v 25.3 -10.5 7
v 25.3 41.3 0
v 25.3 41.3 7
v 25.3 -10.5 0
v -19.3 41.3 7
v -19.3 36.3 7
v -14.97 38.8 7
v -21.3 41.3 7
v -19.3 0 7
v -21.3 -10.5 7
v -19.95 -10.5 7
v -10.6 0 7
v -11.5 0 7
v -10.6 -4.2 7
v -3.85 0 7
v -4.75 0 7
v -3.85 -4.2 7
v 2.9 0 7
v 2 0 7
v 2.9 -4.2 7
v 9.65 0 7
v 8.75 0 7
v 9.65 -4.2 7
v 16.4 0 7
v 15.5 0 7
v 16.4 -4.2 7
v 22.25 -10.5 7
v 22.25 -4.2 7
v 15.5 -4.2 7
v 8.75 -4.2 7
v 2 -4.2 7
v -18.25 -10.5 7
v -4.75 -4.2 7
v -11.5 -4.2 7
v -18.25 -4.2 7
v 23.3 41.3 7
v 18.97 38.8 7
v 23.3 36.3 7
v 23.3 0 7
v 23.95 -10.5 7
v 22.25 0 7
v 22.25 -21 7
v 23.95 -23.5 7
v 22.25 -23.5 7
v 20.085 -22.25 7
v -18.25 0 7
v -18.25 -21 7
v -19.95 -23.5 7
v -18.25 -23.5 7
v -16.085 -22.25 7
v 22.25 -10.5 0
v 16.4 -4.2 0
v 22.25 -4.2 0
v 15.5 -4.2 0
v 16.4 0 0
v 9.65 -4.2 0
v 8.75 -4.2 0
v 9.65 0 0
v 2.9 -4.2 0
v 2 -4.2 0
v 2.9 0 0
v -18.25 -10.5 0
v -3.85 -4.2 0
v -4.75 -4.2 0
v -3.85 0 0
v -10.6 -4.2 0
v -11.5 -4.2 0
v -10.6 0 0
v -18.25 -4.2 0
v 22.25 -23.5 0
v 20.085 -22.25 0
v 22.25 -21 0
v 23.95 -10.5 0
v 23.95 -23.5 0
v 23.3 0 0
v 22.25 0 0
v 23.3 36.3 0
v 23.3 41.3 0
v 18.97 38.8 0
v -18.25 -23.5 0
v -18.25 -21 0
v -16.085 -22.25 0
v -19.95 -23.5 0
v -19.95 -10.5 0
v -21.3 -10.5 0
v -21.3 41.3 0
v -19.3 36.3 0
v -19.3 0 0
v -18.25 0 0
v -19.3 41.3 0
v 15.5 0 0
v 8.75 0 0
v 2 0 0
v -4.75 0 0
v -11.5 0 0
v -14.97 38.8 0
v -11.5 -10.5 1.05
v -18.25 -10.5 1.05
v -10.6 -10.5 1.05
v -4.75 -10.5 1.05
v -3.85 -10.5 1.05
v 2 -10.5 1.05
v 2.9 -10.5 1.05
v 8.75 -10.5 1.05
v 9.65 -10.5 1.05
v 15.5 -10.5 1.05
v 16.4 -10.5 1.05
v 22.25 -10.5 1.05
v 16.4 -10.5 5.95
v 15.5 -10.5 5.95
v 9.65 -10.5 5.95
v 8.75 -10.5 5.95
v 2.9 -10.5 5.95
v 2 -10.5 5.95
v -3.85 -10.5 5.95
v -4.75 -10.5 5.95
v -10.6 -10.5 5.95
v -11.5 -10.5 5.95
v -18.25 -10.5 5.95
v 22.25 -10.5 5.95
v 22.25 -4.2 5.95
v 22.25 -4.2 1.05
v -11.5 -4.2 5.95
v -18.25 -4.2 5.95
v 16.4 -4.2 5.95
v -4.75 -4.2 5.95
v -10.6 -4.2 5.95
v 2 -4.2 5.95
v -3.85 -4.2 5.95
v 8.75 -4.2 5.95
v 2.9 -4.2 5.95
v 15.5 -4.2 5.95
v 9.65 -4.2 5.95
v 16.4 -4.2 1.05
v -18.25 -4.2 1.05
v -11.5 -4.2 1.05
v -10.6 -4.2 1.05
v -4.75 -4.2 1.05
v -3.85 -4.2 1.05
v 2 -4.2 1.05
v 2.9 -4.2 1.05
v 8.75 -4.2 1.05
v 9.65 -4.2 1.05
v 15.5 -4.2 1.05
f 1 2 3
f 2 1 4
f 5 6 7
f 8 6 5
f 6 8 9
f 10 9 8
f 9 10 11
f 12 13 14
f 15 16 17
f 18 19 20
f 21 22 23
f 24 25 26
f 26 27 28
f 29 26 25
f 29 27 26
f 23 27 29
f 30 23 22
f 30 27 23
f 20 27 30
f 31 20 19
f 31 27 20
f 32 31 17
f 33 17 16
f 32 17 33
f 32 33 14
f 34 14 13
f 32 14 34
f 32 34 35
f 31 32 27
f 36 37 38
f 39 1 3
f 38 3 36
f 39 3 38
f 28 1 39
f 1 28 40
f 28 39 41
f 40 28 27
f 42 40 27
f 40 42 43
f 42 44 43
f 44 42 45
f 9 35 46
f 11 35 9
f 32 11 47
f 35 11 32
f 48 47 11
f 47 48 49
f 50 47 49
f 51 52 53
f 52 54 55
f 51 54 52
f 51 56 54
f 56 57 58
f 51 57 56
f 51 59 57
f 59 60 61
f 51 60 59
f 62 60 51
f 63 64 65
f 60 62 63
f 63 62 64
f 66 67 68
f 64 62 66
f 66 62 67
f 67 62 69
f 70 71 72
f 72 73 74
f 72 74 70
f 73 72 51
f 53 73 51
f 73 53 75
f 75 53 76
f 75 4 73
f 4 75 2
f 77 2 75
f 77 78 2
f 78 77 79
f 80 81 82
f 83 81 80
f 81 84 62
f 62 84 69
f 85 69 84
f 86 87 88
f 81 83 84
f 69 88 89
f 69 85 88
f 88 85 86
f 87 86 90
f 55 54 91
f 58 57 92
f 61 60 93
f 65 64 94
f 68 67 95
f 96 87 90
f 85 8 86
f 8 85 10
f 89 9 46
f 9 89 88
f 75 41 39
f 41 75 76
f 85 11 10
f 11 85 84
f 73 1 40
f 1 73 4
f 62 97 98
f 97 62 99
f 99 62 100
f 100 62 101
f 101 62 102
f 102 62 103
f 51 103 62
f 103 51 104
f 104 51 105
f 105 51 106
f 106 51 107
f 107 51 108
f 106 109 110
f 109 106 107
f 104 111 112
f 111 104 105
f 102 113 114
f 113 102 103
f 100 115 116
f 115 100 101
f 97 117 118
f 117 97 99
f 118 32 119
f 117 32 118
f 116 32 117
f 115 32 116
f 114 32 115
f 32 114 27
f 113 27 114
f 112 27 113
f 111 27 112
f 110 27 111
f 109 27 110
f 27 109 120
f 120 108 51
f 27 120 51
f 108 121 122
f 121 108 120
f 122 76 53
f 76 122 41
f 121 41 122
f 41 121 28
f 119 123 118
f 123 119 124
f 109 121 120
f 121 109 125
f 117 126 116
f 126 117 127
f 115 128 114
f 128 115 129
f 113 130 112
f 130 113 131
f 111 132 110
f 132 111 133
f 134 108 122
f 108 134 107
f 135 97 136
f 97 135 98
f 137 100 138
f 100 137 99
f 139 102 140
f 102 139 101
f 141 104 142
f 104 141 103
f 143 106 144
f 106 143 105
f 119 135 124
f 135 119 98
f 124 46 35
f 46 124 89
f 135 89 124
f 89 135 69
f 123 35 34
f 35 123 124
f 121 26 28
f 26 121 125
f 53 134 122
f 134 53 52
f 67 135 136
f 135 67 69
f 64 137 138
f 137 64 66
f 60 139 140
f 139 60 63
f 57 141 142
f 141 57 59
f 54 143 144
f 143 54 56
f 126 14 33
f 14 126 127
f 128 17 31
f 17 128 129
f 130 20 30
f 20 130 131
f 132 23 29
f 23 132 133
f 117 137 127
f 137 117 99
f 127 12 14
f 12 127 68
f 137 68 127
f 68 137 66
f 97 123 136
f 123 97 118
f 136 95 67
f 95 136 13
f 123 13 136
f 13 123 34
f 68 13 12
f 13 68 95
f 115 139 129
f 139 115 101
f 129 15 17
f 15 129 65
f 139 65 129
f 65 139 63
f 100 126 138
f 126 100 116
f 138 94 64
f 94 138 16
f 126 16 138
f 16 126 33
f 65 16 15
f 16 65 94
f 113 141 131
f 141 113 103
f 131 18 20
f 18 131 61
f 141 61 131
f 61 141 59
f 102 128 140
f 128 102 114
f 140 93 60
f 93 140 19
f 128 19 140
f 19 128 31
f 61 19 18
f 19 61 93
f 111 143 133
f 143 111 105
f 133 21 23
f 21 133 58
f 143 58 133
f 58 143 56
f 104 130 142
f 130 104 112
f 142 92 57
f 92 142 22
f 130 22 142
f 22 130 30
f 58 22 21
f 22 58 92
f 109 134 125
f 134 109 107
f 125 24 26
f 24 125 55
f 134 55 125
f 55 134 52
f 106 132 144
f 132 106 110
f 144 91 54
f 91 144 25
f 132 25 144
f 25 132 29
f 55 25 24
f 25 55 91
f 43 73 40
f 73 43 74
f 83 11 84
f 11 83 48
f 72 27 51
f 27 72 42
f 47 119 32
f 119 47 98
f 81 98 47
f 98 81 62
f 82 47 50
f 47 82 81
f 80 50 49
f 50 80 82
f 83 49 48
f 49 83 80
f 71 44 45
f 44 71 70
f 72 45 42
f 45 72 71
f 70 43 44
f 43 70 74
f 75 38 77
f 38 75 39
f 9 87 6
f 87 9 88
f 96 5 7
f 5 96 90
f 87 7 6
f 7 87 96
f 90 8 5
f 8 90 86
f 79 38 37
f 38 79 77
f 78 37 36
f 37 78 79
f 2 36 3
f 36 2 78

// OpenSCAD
//Square to Square Clip
//Example is a Nema17 motor to fan mount
//but not limited to :-).
// Author: KonKop (Bryon Wheeler)


//The object with the largest width should go to Bigger
//The object with the smallest width should go to the Smaller

//Variables
ClipHeight = 7;


//Box with the Largest Width
/* [Largest Box] */   
BiggerWidth = 42.6;
BiggerDepth = 36.3; //to hookable groove
BiggerClipSize = 2; 
BigTeethSize = 5;

//Box with Smallest Width
/* [Smallest Box] */   
SmallerWidth = 40.5;
SmallerDepth = 10.5;
SmallerClipSize = 1.7;
SmallerTeethSize = 2.5;

//
ConnectorDepth = 10.5;
ConnectorWidth = BiggerWidth;


//Air hole in the connector for air
HoleWidth = SmallerWidth;
HoleHeight = ClipHeight * .7;

HoleCutOutWidth = HoleWidth;
HoleCutOut = ConnectorDepth * .4;

NumHoleSpacers = 5;
HoleSupportSpace = (HoleWidth / (NumHoleSpacers + 1));
HoleSupportWidth = .9;



/* 
Triangle
	a: Length of side a
	b: Length of side b
	angle: angle at point angleAB
*/
module Triangle(
			a, b, angle, height=1, heights=undef,
			center=undef, centerXYZ=[false,false,false])
{
	// Calculate Heights at each point
	heightAB = ((heights==undef) ? height : heights[0])/2;
	heightBC = ((heights==undef) ? height : heights[1])/2;
	heightCA = ((heights==undef) ? height : heights[2])/2;
	centerZ = (center || (center==undef && centerXYZ[2]))?0:max(heightAB,heightBC,heightCA);

	// Calculate Offsets for centering
	offsetX = (center || (center==undef && centerXYZ[0]))?((cos(angle)*a)+b)/3:0;
	offsetY = (center || (center==undef && centerXYZ[1]))?(sin(angle)*a)/3:0;
	
	pointAB1 = [-offsetX,-offsetY, centerZ-heightAB];
	pointAB2 = [-offsetX,-offsetY, centerZ+heightAB];
	pointBC1 = [b-offsetX,-offsetY, centerZ-heightBC];
	pointBC2 = [b-offsetX,-offsetY, centerZ+heightBC];
	pointCA1 = [(cos(angle)*a)-offsetX,(sin(angle)*a)-offsetY, centerZ-heightCA];
	pointCA2 = [(cos(angle)*a)-offsetX,(sin(angle)*a)-offsetY, centerZ+heightCA];

	polyhedron(
		points=[	pointAB1, pointBC1, pointCA1,
					pointAB2, pointBC2, pointCA2 ],	
        faces=[	
			[0, 1, 2],
			[3, 5, 4],
			[0, 3, 1],
			[1, 3, 4],
			[1, 4, 2],
			[2, 4, 5],
			[2, 5, 0],
			[0, 5, 3] ] );
}

/*
Equilateral Triangle
	Create a Equilateral Triangle.

	l: Length of all sides (a, b & c)
	H: Triangle size will be based on the this 2D height
		When using H, l is ignored.
*/
module Equilateral_Triangle(
			l=10, H=undef, height=1, heights=undef,
			center=undef, centerXYZ=[true,false,false])
{
	L = (H==undef)?l:H/sin(60);
	Triangle(a=L,b=L,angle=60,height=height, heights=heights,
				center=center, centerXYZ=centerXYZ);
}


module BiggerClip(){
    
    //Bigger Box
    difference(){
    cube(size = [BiggerWidth + (BiggerClipSize * 2),BiggerDepth,ClipHeight], center = false);
    
    translate([BiggerClipSize,0,0])
    cube(size = [BiggerWidth,BiggerDepth,ClipHeight], center = false);
    }
    
    //Teeth
    translate([BiggerClipSize,BiggerDepth+BigTeethSize/2,0]) rotate([0,0,-90]) Equilateral_Triangle(l=BigTeethSize, height = ClipHeight);
    translate([0,BiggerDepth,0])
    cube(size = [BiggerClipSize,BigTeethSize,ClipHeight], center = false);
    
    translate([BiggerClipSize + BiggerWidth,BiggerDepth+BigTeethSize/2,0]) rotate([0,0,90]) Equilateral_Triangle(l=BigTeethSize, height = ClipHeight);
    
    translate([BiggerClipSize + BiggerWidth,BiggerDepth,0])
    cube(size = [BiggerClipSize,BigTeethSize,ClipHeight], center = false);
}

module SmallerClip(){
    //Offset
    Offset = ((BiggerWidth + (BiggerClipSize * 2)) - (SmallerWidth + (SmallerClipSize * 2))) / 2;
    
    //Smaller Box
    translate([Offset,-(SmallerDepth + ConnectorDepth),0])
    difference(){
    cube(size = [SmallerWidth + (SmallerClipSize * 2),SmallerDepth,ClipHeight], center = false);
    
    translate([SmallerClipSize,0,0])
    cube(size = [SmallerWidth,SmallerDepth,ClipHeight], center = false);
    }
    
    //Teeth
    translate([Offset,-SmallerDepth*2 - ConnectorDepth,0])
    {
    translate([SmallerClipSize,SmallerDepth-SmallerTeethSize/2,0]) rotate([0,0,-90])      Equilateral_Triangle(l=SmallerTeethSize, height = ClipHeight);
    
    translate([SmallerClipSize,SmallerDepth-SmallerTeethSize,0])
    translate([-SmallerClipSize,0,0])
    cube(size = [SmallerClipSize,SmallerTeethSize,ClipHeight], center = false);
    
    
    translate([SmallerClipSize + SmallerWidth,SmallerDepth-SmallerTeethSize/2,0]) rotate([0,0,90]) Equilateral_Triangle(l=SmallerTeethSize, height = ClipHeight);
    
    translate([SmallerClipSize + SmallerWidth,SmallerDepth-SmallerTeethSize,0])
    //translate([SmallerClipSize,0,0])
    cube(size = [SmallerClipSize,SmallerTeethSize,ClipHeight], center = false);
    };
}

module SpacerBar(Xval,Depth, Yval){
    translate([Xval,Yval,0])
    cube(size = [HoleSupportWidth,Depth,ClipHeight], center = false);
}

module Connector(){
    SpacerX = ConnectorWidth + (BiggerClipSize * 2);
    translate([0,-SmallerDepth,0])
    {
        difference(){
            cube(size = [SpacerX,ConnectorDepth,ClipHeight], center = false);
        
            //air Hole
            translate([ (SpacerX - HoleWidth)/2,0,(ClipHeight - HoleHeight) / 2])
            cube(size = [HoleWidth,ConnectorDepth,HoleHeight], center = false);
                
//            //Air upper and lower gap    
            translate([ (SpacerX - HoleCutOutWidth)/2,ConnectorDepth-HoleCutOut,0])
            cube(size = [HoleCutOutWidth,HoleCutOut,ClipHeight], center = false);
            
            //support for gap
            //cube(size = [HoleCutOutWidth,HoleCutOut,ClipHeight], center = false);
                
        };
        
        SupportDepth = ConnectorDepth;
        //support bars
        for (a =[(SpacerX - HoleWidth)/2 + HoleSupportSpace:HoleSupportSpace:(SpacerX - HoleWidth)/2 + HoleWidth])SpacerBar(a,SupportDepth,0);
    }
}
translate([-BiggerWidth/2,0,0]){
Connector();
SmallerClip();
BiggerClip();
}
